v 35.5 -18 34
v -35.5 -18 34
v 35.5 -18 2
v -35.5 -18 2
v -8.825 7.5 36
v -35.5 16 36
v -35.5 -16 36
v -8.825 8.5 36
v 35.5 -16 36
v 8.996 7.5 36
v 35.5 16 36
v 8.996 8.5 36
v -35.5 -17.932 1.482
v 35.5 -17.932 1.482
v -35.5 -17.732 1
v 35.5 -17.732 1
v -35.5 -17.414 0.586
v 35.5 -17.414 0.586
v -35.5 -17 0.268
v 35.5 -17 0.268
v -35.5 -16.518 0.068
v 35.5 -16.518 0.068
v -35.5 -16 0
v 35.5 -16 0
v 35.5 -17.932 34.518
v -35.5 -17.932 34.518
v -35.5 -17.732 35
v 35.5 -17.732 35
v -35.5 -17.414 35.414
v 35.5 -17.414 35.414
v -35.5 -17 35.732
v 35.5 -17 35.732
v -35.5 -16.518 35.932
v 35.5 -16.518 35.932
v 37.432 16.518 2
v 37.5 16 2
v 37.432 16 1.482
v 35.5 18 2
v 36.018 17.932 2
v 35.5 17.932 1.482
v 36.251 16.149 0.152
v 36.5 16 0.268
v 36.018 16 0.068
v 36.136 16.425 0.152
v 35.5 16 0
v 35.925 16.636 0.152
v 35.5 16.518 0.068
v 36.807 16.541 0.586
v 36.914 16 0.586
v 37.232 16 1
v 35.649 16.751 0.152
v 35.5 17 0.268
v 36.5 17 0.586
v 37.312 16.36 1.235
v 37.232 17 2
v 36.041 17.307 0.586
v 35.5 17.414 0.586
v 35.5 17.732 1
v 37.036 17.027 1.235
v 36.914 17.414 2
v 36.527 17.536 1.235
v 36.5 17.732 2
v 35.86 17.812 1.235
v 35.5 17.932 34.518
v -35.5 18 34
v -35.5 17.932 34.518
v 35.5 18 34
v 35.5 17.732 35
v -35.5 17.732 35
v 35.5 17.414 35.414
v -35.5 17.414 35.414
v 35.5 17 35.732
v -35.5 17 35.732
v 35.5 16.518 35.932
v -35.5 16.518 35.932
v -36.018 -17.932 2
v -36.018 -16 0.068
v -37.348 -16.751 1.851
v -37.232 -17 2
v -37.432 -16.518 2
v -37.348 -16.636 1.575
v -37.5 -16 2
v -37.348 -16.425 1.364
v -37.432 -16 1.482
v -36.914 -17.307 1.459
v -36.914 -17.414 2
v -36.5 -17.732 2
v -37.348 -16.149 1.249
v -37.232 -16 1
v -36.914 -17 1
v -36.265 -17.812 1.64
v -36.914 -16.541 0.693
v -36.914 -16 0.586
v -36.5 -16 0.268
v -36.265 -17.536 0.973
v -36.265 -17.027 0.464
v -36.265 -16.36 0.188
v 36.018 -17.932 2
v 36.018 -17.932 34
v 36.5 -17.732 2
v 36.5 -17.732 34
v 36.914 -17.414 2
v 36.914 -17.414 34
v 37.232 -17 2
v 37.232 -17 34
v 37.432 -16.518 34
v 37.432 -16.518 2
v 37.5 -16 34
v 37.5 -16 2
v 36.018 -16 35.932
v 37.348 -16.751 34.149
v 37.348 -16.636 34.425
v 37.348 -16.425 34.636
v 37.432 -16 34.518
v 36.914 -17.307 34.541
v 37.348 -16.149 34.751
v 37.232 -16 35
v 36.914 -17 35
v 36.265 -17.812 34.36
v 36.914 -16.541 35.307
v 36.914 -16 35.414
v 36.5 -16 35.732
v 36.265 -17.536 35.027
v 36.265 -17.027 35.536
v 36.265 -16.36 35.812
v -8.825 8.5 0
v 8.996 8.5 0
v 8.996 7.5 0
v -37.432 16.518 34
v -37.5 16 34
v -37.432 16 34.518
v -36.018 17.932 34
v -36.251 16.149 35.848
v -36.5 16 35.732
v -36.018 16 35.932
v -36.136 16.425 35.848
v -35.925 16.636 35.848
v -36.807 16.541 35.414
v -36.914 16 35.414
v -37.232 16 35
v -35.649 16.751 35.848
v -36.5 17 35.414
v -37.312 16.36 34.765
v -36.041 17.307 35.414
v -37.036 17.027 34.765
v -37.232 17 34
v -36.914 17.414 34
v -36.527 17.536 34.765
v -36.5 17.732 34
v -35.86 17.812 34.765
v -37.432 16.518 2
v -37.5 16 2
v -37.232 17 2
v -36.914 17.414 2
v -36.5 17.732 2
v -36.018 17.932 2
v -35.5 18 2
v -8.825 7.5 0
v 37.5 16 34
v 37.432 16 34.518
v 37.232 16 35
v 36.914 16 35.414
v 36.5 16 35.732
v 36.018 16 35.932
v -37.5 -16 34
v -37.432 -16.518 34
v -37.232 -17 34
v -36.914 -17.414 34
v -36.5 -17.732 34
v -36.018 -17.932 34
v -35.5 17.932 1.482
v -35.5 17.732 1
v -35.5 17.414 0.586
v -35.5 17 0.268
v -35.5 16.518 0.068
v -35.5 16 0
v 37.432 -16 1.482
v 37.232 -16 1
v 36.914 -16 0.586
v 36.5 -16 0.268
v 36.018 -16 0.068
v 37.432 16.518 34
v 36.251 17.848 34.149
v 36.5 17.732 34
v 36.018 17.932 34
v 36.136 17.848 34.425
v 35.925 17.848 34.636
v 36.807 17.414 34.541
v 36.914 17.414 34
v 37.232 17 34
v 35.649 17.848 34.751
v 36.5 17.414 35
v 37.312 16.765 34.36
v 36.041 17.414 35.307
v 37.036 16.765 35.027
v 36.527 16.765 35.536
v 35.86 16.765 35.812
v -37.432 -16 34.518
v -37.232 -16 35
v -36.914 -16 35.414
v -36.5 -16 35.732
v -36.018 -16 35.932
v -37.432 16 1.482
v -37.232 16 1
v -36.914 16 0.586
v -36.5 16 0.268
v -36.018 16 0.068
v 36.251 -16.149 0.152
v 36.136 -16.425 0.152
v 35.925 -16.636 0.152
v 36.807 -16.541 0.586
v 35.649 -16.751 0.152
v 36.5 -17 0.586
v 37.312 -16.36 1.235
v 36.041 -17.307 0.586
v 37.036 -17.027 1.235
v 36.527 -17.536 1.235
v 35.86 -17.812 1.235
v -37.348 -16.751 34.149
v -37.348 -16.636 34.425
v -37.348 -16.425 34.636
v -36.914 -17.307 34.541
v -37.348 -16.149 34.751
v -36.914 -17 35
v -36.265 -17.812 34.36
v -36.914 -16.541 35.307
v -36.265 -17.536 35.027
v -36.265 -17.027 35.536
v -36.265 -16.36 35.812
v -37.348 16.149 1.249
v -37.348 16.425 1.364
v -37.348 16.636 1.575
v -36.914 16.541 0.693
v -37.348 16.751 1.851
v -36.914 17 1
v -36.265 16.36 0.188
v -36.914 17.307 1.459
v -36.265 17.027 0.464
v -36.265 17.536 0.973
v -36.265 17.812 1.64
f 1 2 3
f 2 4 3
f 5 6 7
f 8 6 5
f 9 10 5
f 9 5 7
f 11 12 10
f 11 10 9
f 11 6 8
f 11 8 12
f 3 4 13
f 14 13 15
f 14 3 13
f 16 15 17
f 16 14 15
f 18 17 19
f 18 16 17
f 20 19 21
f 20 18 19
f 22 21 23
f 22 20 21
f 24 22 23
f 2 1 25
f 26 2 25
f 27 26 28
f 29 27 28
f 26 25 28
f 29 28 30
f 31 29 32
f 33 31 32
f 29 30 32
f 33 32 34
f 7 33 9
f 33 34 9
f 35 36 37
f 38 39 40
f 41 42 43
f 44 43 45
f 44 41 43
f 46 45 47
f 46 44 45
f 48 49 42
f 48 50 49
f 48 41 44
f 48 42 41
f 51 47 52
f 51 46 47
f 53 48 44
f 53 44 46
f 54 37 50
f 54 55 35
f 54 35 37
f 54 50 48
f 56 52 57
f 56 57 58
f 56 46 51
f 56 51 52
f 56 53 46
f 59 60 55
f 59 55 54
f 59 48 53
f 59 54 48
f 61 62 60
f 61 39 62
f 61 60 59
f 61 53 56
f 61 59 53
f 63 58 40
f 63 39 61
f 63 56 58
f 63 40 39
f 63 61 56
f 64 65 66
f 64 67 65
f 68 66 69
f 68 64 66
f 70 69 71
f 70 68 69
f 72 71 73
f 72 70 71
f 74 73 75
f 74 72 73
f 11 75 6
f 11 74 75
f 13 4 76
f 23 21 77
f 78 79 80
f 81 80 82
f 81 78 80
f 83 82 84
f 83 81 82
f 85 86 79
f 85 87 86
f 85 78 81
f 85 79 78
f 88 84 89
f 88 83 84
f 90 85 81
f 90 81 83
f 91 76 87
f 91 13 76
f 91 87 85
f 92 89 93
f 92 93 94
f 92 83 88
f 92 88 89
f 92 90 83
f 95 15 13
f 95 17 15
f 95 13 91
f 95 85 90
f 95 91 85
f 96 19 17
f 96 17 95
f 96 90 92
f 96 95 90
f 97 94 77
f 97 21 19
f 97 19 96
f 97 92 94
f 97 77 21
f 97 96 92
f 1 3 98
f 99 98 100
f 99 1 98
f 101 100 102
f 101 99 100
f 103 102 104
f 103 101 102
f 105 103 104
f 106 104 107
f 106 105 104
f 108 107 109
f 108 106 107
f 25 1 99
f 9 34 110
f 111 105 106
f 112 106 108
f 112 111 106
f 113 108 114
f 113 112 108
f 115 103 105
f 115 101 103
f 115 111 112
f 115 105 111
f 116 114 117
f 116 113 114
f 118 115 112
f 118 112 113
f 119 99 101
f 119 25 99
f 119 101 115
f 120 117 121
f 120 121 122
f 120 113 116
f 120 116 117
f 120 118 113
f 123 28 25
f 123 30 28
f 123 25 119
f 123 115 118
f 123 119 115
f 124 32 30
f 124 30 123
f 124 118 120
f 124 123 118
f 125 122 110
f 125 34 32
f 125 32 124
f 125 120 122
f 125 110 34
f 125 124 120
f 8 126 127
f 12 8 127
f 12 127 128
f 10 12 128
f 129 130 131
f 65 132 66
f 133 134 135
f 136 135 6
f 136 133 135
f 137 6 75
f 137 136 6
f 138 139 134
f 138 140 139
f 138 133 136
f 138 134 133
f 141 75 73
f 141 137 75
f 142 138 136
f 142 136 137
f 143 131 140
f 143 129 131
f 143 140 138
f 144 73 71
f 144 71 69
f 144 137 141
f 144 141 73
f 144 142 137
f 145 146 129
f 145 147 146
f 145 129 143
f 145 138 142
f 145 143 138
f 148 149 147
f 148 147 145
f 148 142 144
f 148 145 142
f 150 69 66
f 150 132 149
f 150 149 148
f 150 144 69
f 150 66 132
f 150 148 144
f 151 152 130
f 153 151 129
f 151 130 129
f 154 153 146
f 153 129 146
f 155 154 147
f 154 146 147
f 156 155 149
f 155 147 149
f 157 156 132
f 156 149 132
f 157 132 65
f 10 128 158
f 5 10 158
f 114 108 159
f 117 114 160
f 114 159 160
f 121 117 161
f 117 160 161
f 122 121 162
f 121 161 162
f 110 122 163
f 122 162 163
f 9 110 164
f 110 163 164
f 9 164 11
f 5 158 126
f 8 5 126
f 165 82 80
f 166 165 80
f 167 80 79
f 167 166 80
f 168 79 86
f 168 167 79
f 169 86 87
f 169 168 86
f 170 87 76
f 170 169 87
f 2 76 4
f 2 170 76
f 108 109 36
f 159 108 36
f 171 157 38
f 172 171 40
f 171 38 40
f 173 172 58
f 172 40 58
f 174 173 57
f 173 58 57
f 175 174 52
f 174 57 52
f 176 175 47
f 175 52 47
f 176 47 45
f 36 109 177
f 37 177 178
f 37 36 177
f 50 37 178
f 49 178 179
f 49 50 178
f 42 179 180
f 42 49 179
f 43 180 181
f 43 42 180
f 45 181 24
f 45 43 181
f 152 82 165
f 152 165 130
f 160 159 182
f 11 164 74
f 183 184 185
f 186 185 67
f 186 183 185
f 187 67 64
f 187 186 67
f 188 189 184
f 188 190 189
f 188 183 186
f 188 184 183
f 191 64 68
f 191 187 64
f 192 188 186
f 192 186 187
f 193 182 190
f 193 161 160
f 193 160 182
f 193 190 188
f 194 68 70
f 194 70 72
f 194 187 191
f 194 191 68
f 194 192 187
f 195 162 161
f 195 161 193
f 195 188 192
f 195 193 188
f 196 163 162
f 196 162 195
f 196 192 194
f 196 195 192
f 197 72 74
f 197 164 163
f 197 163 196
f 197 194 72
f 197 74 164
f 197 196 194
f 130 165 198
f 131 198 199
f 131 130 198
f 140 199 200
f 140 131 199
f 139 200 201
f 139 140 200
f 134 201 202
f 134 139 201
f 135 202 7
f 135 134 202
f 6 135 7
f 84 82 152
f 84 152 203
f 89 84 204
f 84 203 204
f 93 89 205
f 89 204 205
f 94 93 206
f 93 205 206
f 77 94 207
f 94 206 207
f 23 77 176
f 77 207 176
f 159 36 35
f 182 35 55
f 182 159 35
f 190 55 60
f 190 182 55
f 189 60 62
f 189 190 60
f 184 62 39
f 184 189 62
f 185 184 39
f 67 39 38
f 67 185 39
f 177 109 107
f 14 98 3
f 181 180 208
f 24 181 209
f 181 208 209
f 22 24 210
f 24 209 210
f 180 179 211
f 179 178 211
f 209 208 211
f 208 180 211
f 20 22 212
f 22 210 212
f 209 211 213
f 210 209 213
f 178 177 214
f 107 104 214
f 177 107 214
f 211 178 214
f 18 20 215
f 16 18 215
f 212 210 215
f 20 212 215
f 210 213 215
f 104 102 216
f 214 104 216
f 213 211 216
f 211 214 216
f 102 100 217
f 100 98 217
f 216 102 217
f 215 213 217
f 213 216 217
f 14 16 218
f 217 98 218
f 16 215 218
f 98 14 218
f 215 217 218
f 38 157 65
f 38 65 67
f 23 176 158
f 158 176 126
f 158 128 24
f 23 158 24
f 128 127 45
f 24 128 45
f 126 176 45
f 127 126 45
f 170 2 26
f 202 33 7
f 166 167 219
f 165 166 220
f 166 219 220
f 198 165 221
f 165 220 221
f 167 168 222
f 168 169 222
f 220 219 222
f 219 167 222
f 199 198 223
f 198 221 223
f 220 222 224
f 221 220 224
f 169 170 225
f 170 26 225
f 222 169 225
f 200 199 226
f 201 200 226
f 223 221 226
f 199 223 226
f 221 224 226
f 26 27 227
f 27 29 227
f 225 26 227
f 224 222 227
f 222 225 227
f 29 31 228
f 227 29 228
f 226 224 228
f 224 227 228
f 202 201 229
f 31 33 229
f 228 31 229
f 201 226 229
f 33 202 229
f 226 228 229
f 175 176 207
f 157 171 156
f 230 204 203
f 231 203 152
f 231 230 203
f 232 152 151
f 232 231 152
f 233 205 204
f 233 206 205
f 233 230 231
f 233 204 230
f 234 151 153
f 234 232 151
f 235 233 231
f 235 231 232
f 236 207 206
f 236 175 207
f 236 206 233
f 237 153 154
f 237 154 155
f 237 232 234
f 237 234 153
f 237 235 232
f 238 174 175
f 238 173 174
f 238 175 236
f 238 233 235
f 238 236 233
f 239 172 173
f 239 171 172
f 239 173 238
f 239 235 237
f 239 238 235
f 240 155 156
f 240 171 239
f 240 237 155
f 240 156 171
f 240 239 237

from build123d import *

# Parameters (mm, degrees)
F0_W     = 75
F0_H     = 36
F1_DEPTH = 36
F2_R     = 2


with BuildPart() as f1:
    # F0 (on Top) → F1 (new body)
    with BuildSketch(Plane.XY):
        Rectangle(F0_W, F0_H)
        Polygon((-8.825392, 7.5), (-8.825392, 8), (-8.825392, 8.5), (8.995996, 8.5), (8.995996, 8), (8.995996, 7.5), align=None, mode=Mode.SUBTRACT)
    extrude(amount=F1_DEPTH)

    # F2
    f2_edges = [f1.edges().sort_by_distance(p)[0] for p in [
        (0, -18, 36),
        (37.5, -18, 18),
        (37.5, 0, 36),
        (37.5, 18, 18),
        (37.5, 0, 0),
        (0, -18, 0),
        (-37.5, -18, 18),
        (0, 18, 0),
        (-37.5, 0, 0),
        (-37.5, 18, 18),
        (-37.5, 0, 36),
        (0, 18, 36),
    ]]
    fillet(f2_edges, radius=F2_R)


solid = f1.part
